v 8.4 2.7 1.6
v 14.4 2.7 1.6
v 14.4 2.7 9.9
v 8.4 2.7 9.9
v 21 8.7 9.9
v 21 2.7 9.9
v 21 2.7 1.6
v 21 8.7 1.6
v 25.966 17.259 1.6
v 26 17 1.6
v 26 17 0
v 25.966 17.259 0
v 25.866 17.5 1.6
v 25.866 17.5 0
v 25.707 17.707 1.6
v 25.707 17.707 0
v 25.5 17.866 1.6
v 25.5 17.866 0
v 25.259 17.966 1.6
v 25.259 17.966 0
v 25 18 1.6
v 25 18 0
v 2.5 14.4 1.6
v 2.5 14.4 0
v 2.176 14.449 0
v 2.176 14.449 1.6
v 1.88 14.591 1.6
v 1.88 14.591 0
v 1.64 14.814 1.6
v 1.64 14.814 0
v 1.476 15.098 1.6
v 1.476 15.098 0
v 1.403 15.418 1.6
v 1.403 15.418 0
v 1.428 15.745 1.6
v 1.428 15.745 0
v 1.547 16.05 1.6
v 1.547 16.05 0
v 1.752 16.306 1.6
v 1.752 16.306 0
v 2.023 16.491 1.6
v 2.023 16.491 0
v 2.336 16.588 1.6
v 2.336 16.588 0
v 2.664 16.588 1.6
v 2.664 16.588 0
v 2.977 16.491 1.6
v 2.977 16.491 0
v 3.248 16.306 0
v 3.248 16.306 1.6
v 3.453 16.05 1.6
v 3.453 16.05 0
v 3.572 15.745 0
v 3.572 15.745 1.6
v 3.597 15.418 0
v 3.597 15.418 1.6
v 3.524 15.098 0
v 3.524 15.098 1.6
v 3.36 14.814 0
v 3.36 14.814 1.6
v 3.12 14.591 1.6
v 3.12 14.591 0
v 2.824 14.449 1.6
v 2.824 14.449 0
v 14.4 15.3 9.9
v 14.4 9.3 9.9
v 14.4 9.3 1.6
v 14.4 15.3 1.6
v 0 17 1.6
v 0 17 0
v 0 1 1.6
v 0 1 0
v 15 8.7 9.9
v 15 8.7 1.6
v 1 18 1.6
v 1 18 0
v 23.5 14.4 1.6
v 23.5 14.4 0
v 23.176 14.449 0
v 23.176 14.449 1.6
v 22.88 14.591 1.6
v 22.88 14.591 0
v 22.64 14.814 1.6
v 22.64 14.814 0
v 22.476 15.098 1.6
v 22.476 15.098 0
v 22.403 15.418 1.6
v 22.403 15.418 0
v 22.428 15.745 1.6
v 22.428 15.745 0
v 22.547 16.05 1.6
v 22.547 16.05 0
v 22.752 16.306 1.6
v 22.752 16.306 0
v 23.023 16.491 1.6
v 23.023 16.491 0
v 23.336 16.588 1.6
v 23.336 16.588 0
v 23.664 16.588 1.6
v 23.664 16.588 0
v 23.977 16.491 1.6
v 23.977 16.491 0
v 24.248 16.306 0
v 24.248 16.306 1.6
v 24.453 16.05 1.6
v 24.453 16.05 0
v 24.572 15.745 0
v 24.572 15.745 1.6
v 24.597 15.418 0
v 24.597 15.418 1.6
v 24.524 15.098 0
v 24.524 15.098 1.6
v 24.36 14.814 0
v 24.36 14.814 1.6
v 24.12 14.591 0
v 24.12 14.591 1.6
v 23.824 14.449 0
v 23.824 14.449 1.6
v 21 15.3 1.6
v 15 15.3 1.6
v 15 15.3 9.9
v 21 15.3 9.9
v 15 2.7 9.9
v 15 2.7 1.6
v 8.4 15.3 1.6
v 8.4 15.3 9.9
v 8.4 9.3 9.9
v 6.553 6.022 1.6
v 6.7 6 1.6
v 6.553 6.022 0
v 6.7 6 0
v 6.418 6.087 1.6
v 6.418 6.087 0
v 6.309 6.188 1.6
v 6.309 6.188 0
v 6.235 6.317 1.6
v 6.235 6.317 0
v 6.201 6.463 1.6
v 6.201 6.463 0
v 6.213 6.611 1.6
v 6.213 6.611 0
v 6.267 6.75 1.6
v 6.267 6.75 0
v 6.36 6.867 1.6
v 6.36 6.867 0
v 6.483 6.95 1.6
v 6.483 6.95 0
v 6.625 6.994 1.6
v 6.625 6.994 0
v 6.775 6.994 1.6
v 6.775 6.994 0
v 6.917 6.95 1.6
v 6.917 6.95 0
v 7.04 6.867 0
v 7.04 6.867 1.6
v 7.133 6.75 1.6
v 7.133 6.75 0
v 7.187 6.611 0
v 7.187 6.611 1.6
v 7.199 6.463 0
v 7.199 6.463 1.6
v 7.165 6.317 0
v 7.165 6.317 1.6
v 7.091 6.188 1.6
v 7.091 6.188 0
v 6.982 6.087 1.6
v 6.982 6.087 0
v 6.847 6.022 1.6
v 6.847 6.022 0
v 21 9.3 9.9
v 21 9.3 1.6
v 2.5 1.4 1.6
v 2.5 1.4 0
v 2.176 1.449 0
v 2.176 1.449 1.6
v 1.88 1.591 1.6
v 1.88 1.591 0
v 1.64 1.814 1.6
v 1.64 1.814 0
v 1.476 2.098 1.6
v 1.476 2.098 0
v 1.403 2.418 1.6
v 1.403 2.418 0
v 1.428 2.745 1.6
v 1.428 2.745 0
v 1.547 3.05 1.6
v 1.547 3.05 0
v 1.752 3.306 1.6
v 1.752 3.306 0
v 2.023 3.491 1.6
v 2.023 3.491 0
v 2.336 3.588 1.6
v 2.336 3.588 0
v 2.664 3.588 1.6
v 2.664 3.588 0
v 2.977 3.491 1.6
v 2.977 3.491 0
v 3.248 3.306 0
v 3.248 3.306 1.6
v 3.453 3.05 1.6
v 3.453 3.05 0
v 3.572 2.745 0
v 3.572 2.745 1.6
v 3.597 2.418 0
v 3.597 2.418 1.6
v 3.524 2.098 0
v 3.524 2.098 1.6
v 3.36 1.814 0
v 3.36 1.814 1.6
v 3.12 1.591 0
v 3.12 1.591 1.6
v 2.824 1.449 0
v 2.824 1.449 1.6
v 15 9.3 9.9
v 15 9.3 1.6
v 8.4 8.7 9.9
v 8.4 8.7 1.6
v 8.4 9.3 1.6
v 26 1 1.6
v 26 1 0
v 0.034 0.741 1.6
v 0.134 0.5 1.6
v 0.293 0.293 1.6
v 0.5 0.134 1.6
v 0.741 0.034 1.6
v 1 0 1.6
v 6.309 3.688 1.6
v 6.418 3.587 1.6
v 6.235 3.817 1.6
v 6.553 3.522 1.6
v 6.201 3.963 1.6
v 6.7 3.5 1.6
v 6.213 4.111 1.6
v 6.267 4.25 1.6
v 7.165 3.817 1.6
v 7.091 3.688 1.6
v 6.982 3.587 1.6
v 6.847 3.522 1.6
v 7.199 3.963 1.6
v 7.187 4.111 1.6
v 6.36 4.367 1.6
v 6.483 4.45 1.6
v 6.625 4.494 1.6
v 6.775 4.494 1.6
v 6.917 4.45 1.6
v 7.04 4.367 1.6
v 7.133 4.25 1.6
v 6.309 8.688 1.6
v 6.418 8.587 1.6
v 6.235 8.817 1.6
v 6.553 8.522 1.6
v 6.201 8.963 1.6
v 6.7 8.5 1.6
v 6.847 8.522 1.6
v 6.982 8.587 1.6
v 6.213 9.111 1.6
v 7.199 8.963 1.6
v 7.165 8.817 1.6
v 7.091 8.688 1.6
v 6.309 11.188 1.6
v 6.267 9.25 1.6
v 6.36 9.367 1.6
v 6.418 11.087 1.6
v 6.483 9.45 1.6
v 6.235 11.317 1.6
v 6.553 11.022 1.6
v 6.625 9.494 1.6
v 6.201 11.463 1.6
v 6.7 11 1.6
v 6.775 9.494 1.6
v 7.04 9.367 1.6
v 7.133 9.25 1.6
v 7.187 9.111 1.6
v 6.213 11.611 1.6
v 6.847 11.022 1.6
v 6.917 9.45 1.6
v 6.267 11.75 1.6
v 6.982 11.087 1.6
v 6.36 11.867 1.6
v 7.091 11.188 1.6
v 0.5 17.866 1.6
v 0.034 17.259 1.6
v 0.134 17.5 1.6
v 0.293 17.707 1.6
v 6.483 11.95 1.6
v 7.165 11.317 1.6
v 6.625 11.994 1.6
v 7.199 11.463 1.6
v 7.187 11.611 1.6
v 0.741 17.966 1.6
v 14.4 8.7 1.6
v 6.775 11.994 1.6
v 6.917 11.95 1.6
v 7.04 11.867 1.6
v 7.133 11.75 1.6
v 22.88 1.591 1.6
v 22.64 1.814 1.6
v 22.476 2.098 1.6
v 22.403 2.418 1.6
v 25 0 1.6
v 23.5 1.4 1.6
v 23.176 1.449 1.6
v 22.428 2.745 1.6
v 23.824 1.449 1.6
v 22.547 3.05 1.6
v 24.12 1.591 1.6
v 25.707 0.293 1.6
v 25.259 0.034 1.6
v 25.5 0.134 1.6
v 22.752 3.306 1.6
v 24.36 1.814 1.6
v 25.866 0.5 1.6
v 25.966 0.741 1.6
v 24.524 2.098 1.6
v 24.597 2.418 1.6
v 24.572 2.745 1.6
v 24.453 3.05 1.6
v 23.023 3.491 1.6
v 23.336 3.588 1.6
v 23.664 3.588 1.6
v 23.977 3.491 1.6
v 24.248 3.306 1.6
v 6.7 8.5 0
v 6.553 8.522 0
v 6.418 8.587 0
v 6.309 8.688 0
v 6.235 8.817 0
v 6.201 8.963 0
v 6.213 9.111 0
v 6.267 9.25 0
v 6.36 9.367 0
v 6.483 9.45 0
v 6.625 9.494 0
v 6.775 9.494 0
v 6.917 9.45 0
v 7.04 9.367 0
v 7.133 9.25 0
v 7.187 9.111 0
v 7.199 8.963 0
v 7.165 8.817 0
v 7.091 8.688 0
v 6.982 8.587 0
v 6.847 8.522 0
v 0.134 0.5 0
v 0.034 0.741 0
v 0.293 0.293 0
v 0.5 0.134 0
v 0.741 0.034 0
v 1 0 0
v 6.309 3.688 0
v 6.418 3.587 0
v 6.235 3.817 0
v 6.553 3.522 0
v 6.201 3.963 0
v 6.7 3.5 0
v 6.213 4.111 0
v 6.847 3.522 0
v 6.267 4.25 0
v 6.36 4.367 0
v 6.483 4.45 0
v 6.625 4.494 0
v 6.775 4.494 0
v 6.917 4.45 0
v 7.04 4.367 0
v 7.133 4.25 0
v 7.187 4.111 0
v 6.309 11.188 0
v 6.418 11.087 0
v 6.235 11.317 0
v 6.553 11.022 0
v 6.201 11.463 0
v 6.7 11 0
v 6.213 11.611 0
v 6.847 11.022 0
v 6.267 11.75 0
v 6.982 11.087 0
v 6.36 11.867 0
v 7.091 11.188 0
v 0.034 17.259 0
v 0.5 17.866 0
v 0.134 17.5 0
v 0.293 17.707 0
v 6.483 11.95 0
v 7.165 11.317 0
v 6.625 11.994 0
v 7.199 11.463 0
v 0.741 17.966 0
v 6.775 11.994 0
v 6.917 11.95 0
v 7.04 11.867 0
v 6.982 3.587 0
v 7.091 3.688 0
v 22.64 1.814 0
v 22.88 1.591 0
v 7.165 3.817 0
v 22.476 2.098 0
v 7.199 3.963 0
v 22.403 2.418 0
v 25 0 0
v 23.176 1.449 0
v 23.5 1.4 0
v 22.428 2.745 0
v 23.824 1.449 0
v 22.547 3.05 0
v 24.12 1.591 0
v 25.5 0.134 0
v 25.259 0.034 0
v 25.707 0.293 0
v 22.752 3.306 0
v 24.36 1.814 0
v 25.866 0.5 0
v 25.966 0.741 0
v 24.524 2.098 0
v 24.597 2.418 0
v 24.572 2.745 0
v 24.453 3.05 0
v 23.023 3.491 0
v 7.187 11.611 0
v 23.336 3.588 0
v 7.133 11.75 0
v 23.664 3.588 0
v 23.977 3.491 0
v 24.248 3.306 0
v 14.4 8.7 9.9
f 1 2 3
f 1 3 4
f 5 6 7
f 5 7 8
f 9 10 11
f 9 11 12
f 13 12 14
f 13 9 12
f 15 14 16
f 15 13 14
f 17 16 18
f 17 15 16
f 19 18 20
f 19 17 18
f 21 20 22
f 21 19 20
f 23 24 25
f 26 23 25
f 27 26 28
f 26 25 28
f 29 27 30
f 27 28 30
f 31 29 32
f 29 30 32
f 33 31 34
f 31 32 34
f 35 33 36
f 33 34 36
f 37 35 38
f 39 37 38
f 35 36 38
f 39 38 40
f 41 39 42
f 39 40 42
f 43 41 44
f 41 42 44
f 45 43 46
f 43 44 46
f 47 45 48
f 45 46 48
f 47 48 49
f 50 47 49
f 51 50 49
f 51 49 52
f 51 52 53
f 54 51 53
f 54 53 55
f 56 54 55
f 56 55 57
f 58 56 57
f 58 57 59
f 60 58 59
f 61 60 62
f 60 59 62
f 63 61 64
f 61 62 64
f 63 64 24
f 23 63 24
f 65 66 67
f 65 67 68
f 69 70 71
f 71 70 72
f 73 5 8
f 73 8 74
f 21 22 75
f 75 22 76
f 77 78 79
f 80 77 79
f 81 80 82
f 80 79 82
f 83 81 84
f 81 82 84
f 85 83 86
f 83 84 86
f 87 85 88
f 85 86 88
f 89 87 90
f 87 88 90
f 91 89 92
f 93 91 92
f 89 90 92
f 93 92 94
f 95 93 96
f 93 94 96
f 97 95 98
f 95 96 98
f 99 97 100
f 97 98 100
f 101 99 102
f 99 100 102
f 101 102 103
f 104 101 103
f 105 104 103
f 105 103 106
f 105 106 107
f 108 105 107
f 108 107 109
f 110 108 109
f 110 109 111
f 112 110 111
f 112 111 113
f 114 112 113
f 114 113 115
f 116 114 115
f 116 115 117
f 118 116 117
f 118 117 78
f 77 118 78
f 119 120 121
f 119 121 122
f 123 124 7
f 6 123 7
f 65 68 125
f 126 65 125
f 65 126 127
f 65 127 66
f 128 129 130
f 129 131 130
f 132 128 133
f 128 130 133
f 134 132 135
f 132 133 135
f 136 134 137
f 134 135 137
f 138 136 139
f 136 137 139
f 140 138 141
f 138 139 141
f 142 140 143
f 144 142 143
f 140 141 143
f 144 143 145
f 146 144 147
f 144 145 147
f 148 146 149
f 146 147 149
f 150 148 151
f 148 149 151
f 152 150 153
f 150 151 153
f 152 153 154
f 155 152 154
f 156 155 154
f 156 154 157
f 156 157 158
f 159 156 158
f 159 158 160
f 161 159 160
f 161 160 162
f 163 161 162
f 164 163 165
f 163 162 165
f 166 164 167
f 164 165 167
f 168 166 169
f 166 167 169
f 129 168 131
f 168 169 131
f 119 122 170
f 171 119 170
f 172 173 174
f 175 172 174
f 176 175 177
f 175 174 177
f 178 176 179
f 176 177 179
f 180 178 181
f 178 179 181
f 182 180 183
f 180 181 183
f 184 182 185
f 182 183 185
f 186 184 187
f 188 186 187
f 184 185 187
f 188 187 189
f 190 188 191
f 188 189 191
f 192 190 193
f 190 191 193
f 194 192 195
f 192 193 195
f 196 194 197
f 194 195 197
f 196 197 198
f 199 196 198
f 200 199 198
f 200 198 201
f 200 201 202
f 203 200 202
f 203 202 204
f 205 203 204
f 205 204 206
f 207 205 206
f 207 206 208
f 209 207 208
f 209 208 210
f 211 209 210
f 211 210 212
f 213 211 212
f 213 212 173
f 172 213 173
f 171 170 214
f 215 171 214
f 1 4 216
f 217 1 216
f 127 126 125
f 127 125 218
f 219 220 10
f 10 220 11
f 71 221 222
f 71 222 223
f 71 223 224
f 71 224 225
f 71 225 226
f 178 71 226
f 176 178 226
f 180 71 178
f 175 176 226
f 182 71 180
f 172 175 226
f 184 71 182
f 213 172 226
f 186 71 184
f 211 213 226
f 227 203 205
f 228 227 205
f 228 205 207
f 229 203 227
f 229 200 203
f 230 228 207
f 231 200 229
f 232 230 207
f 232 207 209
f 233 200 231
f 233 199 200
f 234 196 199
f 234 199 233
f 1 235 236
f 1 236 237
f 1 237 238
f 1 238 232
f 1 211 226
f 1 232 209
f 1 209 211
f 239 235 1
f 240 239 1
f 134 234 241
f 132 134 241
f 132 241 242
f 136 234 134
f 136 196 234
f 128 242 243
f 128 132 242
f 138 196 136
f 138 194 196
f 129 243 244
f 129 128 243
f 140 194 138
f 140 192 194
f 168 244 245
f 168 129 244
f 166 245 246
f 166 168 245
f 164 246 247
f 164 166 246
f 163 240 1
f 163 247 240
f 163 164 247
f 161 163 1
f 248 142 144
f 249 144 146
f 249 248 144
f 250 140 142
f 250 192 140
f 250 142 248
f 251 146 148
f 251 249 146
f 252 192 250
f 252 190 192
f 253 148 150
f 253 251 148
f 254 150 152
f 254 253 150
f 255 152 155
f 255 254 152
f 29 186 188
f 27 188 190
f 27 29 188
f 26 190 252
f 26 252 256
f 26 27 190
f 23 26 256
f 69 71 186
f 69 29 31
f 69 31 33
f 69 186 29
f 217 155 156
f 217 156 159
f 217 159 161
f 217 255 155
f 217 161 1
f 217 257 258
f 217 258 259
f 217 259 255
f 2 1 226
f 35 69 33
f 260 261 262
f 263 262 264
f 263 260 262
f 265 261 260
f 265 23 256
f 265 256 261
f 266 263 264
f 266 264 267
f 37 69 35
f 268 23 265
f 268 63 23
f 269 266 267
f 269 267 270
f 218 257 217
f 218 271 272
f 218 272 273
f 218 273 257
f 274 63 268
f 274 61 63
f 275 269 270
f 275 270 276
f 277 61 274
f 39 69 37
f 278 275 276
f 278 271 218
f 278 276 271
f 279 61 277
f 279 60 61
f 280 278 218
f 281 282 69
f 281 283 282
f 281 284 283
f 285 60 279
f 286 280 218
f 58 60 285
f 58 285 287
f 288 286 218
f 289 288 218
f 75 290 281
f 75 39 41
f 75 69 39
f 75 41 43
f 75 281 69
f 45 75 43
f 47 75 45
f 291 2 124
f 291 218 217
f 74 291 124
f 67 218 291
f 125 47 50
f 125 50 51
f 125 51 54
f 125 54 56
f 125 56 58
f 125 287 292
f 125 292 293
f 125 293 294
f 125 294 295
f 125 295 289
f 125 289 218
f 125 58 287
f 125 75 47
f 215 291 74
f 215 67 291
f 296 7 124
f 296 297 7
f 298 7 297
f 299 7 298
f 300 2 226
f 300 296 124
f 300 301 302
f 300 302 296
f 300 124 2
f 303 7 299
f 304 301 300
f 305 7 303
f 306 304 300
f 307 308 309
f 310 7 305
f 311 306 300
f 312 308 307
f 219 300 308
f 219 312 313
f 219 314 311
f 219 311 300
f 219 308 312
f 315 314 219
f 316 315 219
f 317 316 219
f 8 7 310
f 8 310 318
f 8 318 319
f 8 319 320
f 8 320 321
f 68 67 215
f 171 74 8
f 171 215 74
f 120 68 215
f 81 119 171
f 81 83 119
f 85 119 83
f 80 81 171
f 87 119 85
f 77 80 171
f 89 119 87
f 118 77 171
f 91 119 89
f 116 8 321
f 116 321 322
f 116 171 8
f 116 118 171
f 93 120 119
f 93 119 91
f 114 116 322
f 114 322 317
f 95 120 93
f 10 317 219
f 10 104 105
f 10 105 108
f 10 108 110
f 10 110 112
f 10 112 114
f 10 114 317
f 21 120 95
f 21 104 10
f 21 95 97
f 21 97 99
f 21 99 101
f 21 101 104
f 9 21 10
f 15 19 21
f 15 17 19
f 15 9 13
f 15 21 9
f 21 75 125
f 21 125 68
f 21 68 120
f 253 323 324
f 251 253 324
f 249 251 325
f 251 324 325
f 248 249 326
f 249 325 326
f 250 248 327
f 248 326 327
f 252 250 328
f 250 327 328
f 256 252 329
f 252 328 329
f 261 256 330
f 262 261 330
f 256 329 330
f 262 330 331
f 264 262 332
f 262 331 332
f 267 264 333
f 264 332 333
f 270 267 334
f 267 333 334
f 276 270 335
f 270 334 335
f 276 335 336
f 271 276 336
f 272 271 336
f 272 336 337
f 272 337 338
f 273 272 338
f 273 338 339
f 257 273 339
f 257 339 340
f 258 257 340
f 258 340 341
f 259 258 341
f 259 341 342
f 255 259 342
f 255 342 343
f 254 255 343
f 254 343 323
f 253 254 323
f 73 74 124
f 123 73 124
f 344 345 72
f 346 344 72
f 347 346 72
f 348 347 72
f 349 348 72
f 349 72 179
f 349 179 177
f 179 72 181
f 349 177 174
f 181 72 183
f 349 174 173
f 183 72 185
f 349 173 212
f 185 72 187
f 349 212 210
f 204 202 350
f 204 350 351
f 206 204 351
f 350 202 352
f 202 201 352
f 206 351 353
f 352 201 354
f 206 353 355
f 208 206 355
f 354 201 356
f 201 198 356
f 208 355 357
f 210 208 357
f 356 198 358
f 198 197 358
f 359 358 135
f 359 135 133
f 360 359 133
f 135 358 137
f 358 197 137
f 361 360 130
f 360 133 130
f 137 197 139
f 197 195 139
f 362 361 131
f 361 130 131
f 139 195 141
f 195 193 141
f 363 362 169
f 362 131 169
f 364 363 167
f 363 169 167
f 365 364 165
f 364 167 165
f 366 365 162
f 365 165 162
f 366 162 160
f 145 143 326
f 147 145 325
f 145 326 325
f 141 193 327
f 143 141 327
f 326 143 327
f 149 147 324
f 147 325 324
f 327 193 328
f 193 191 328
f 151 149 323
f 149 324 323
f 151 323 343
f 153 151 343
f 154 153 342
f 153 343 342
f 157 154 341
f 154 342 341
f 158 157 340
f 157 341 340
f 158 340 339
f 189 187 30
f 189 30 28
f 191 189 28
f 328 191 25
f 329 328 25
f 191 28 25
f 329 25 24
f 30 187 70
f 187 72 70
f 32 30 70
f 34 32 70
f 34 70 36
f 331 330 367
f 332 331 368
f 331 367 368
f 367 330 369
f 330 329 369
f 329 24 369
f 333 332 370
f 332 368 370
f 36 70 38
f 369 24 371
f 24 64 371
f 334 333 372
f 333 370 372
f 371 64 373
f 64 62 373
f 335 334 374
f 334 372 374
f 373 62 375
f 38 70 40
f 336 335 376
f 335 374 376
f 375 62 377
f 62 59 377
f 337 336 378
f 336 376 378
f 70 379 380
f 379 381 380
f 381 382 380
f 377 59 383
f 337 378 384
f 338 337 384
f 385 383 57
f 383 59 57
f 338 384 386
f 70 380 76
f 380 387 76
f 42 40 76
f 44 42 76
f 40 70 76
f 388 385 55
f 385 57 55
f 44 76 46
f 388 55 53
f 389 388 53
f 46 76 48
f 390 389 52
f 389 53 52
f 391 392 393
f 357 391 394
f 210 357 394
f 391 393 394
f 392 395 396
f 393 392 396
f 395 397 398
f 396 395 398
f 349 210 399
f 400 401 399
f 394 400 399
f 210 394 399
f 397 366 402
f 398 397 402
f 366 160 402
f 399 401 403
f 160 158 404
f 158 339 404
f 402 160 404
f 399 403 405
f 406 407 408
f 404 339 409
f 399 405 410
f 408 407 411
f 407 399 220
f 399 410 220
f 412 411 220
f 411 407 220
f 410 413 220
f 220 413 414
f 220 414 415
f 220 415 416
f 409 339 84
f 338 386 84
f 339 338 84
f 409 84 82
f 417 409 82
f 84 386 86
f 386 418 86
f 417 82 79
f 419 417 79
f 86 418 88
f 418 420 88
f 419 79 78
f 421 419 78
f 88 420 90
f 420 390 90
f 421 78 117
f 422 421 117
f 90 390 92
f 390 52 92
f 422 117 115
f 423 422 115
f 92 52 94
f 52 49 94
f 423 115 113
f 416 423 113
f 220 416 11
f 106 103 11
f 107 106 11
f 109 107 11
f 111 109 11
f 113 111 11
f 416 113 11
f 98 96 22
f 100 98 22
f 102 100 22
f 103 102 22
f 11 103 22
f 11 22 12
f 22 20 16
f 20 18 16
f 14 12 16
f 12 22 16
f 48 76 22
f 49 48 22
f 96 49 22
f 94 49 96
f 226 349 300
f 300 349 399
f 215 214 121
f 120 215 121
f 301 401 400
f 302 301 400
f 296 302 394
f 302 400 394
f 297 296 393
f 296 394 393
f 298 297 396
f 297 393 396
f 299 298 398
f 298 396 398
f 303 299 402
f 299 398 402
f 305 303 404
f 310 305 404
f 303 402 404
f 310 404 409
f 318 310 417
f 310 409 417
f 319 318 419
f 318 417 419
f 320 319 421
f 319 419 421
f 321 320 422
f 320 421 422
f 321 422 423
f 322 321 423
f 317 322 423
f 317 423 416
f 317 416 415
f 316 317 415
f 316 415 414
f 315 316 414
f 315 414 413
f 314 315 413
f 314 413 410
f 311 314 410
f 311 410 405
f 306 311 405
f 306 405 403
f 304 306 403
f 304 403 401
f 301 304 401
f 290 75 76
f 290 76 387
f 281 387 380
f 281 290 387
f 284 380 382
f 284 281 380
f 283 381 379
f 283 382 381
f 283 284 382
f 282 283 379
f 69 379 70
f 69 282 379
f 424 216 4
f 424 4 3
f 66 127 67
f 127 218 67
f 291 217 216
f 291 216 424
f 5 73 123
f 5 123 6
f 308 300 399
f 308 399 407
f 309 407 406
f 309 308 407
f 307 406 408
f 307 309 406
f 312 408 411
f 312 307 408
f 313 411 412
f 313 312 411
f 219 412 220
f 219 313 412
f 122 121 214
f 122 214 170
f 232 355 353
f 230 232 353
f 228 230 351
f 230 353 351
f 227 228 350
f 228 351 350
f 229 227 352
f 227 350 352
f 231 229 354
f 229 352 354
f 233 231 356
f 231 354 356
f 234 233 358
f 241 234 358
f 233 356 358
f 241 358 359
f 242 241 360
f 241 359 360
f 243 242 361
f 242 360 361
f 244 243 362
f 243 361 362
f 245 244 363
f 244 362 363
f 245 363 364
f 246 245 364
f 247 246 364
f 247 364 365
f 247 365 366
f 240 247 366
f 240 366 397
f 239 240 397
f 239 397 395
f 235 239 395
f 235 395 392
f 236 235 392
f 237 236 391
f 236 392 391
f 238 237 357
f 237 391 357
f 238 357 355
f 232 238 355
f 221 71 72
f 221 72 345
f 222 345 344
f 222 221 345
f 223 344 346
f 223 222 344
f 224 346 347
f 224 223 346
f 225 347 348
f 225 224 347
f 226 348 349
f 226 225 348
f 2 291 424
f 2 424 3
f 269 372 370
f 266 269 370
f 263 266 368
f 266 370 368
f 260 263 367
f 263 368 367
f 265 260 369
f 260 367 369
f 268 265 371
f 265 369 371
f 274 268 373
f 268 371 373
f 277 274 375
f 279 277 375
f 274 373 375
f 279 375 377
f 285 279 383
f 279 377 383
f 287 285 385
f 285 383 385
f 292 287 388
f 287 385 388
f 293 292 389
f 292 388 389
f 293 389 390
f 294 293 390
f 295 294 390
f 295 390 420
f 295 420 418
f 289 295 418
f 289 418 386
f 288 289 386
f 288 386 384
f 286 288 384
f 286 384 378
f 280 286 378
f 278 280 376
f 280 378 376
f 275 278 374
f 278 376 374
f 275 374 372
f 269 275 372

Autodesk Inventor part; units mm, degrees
ref_plane "YZ Plane" through (0, 0, 0) normal (1, 0, 0) x (0, 1, 0)
ref_plane "XZ Plane" through (0, 0, 0) normal (0, 1, 0) x (-1, 0, 0)
ref_plane "XY Plane" through (0, 0, 0) normal (0, 0, 1) x (1, 0, 0)
sketch "スケッチ1" plane through (0, 0, 0) normal (0, 0, 1) x (1, 0, 0)
  line L0 (0, 0) -> (26, 0)
  line L1 (26, 0) -> (26, 18)
  line L2 (26, 18) -> (0, 18)
  line L3 (0, 18) -> (0, 0)
  dimension "d0" = 26
  dimension "d1" = 18
extrude "押し出し1" add sketch "スケッチ1" along normal blind 1.6
sketch "スケッチ2" plane through (0, 0, 1.6) normal (0, 0, 1) x (1, 0, 0)
  line L0 (0, 0) -> (26, 0) projected
  line L1 (26, 0) -> (26, 18) projected
  line L2 (26, 18) -> (0, 18) projected
  line L3 (0, 18) -> (0, 0) projected
  line L4 (23.5, 2.5) -> (2.5, 2.5)
  line L5 (2.5, 2.5) -> (2.5, 15.5)
  line L6 (2.5, 15.5) -> (23.5, 15.5)
  line L7 (23.5, 15.5) -> (23.5, 2.5)
  dimension "d4" = 2.5
hole "穴1" at (23.5, 15.5, 1.6) at (23.5, 2.5, 1.6) at (2.5, 2.5, 1.6) at (2.5, 15.5, 1.6) direction (0, 0, -1) diameter 2.2 end through all
fillet "フィレット1" radius 1 4 edges at (0, 0, 0.8) (26, 0, 0.8) (0, 18, 0.8) (26, 18, 0.8)
sketch "スケッチ4" plane through (0, 0, 1.6) normal (0, 0, 1) x (1, 0, 0)
  circle A0 centre (2.5, 2.5) radius 1.1 projected
  circle A1 centre (23.5, 15.5) radius 1.1 projected
  circle A2 centre (23.5, 2.5) radius 1.1 projected
  circle A3 centre (2.5, 15.5) radius 1.1 projected
  arc A4 (26, 17) -> (25, 18) centre (25, 17) ccw projected
  line L0 (25, 18) -> (1, 18) projected
  arc A5 (1, 18) -> (0, 17) centre (1, 17) ccw projected
  line L1 (0, 17) -> (0, 1) projected
  arc A6 (0, 1) -> (1, 0) centre (1, 1) ccw projected
  line L2 (1, 0) -> (25, 0) projected
  arc A7 (25, 0) -> (26, 1) centre (25, 1) ccw projected
  line L3 (26, 1) -> (26, 17) projected
  line L4 (15, 15.3) -> (21, 15.3)
  line L5 (21, 15.3) -> (21, 9.3)
  line L6 (21, 9.3) -> (15, 9.3)
  line L7 (15, 9.3) -> (15, 15.3)
  line L8 (26, 1) -> (26, 17) projected
  line L9 (26, 9) -> (14.7, 9)
  line L10 (15, 2.7) -> (21, 2.7)
  line L11 (21, 2.7) -> (21, 8.7)
  line L12 (21, 8.7) -> (15, 8.7)
  line L13 (15, 8.7) -> (15, 2.7)
  line L14 (14.7, 9) -> (14.7, 10.3555)
  line L15 (14.4, 15.3) -> (8.4, 15.3)
  line L16 (8.4, 15.3) -> (8.4, 9.3)
  line L17 (8.4, 9.3) -> (14.4, 9.3)
  line L18 (14.4, 9.3) -> (14.4, 15.3)
  line L19 (14.4, 8.7) -> (14.4, 2.7)
  line L20 (14.4, 2.7) -> (8.4, 2.7)
  line L21 (8.4, 8.7) -> (14.4, 8.7)
  line L22 (8.4, 2.7) -> (8.4, 8.7)
  point P0 (0, 0)
  dimension "d24" = 6
  dimension "d25" = 6
  dimension "d26" = 0.6
  dimension "d27" = 0.6
  dimension "d28" = 5
extrude "押し出し2" add sketch "スケッチ4" along normal blind 8.3 contours L4 L5 L6 L7 | L13 L12 L11 L10 | L18 L17 L16 L15 | L19 L20 L22 L21
sketch "スケッチ6" plane through (0, 0, 1.6) normal (0, 0, 1) x (1, 0, 0)
  line L0 (0, 17) -> (0, 1) projected
  line L1 (0, 9) -> (6.7, 9)
  line L2 (6.7, 9) -> (6.7, 11.5)
  circle A0 centre (6.7, 11.5) radius 0.8483
  circle A1 centre (6.7, 9) radius 0.8884
  circle A2 centre (6.7, 6.5) radius 0.8483
  circle A3 centre (6.7, 9) radius 0.8884
  point P0 (0, 0)
  dimension "d33" = 6.7
  dimension "d34" = 2.5
  dimension "d35" = 0
hole "穴3" at (6.7, 11.5, 1.6) at (6.7, 9, 1.6) at (6.7, 9, 1.6) at (6.7, 6.5, 1.6) direction (0, 0, -1) diameter 1 end through all
sketch "スケッチ8" plane through (0, 0, 1.6) normal (0, 0, 1) x (1, 0, 0)
  circle A0 centre (6.7, 9) radius 0.5 projected
  circle A1 centre (6.7, 11.5) radius 0.5 projected
  circle A2 centre (6.7, 6.5) radius 0.5 projected
  line L0 (14.4, 15.3) -> (14.4, 9.3) projected
  line L1 (14.4, 9.3) -> (8.4, 9.3) projected
  line L2 (8.4, 9.3) -> (8.4, 15.3) projected
  line L3 (8.4, 15.3) -> (14.4, 15.3) projected
  line L4 (21, 15.3) -> (21, 9.3) projected
  line L5 (21, 9.3) -> (15, 9.3) projected
  line L6 (15, 9.3) -> (15, 15.3) projected
  line L7 (15, 15.3) -> (21, 15.3) projected
  line L8 (21, 8.7) -> (21, 2.7) projected
  line L9 (21, 2.7) -> (15, 2.7) projected
  line L10 (15, 2.7) -> (15, 8.7) projected
  line L11 (15, 8.7) -> (21, 8.7) projected
  line L12 (14.4, 8.7) -> (14.4, 2.7) projected
  line L13 (14.4, 2.7) -> (8.4, 2.7) projected
  line L14 (8.4, 2.7) -> (8.4, 8.7) projected
  line L15 (8.4, 8.7) -> (14.4, 8.7) projected
  circle A3 centre (2.5, 2.5) radius 1.1 projected
  circle A4 centre (23.5, 15.5) radius 1.1 projected
  circle A5 centre (23.5, 2.5) radius 1.1 projected
  circle A6 centre (2.5, 15.5) radius 1.1 projected
  arc A7 (26, 17) -> (25, 18) centre (25, 17) ccw projected
  line L16 (25, 18) -> (1, 18) projected
  arc A8 (1, 18) -> (0, 17) centre (1, 17) ccw projected
  line L17 (0, 17) -> (0, 1) projected
  arc A9 (0, 1) -> (1, 0) centre (1, 1) ccw projected
  line L18 (1, 0) -> (25, 0) projected
  arc A10 (25, 0) -> (26, 1) centre (25, 1) ccw projected
  line L19 (26, 1) -> (26, 17) projected
  line L20 (6.7, 6.5) -> (6.7, 4)
  circle A11 centre (6.7, 4) radius 0.5842
  point P0 (0, 0)
  dimension "d44" = 2.5
hole "穴4" at (6.7, 4, 1.6) direction (0, 0, -1) diameter 1 end through all
properties part number "中継ハブ" material "GFRC"
